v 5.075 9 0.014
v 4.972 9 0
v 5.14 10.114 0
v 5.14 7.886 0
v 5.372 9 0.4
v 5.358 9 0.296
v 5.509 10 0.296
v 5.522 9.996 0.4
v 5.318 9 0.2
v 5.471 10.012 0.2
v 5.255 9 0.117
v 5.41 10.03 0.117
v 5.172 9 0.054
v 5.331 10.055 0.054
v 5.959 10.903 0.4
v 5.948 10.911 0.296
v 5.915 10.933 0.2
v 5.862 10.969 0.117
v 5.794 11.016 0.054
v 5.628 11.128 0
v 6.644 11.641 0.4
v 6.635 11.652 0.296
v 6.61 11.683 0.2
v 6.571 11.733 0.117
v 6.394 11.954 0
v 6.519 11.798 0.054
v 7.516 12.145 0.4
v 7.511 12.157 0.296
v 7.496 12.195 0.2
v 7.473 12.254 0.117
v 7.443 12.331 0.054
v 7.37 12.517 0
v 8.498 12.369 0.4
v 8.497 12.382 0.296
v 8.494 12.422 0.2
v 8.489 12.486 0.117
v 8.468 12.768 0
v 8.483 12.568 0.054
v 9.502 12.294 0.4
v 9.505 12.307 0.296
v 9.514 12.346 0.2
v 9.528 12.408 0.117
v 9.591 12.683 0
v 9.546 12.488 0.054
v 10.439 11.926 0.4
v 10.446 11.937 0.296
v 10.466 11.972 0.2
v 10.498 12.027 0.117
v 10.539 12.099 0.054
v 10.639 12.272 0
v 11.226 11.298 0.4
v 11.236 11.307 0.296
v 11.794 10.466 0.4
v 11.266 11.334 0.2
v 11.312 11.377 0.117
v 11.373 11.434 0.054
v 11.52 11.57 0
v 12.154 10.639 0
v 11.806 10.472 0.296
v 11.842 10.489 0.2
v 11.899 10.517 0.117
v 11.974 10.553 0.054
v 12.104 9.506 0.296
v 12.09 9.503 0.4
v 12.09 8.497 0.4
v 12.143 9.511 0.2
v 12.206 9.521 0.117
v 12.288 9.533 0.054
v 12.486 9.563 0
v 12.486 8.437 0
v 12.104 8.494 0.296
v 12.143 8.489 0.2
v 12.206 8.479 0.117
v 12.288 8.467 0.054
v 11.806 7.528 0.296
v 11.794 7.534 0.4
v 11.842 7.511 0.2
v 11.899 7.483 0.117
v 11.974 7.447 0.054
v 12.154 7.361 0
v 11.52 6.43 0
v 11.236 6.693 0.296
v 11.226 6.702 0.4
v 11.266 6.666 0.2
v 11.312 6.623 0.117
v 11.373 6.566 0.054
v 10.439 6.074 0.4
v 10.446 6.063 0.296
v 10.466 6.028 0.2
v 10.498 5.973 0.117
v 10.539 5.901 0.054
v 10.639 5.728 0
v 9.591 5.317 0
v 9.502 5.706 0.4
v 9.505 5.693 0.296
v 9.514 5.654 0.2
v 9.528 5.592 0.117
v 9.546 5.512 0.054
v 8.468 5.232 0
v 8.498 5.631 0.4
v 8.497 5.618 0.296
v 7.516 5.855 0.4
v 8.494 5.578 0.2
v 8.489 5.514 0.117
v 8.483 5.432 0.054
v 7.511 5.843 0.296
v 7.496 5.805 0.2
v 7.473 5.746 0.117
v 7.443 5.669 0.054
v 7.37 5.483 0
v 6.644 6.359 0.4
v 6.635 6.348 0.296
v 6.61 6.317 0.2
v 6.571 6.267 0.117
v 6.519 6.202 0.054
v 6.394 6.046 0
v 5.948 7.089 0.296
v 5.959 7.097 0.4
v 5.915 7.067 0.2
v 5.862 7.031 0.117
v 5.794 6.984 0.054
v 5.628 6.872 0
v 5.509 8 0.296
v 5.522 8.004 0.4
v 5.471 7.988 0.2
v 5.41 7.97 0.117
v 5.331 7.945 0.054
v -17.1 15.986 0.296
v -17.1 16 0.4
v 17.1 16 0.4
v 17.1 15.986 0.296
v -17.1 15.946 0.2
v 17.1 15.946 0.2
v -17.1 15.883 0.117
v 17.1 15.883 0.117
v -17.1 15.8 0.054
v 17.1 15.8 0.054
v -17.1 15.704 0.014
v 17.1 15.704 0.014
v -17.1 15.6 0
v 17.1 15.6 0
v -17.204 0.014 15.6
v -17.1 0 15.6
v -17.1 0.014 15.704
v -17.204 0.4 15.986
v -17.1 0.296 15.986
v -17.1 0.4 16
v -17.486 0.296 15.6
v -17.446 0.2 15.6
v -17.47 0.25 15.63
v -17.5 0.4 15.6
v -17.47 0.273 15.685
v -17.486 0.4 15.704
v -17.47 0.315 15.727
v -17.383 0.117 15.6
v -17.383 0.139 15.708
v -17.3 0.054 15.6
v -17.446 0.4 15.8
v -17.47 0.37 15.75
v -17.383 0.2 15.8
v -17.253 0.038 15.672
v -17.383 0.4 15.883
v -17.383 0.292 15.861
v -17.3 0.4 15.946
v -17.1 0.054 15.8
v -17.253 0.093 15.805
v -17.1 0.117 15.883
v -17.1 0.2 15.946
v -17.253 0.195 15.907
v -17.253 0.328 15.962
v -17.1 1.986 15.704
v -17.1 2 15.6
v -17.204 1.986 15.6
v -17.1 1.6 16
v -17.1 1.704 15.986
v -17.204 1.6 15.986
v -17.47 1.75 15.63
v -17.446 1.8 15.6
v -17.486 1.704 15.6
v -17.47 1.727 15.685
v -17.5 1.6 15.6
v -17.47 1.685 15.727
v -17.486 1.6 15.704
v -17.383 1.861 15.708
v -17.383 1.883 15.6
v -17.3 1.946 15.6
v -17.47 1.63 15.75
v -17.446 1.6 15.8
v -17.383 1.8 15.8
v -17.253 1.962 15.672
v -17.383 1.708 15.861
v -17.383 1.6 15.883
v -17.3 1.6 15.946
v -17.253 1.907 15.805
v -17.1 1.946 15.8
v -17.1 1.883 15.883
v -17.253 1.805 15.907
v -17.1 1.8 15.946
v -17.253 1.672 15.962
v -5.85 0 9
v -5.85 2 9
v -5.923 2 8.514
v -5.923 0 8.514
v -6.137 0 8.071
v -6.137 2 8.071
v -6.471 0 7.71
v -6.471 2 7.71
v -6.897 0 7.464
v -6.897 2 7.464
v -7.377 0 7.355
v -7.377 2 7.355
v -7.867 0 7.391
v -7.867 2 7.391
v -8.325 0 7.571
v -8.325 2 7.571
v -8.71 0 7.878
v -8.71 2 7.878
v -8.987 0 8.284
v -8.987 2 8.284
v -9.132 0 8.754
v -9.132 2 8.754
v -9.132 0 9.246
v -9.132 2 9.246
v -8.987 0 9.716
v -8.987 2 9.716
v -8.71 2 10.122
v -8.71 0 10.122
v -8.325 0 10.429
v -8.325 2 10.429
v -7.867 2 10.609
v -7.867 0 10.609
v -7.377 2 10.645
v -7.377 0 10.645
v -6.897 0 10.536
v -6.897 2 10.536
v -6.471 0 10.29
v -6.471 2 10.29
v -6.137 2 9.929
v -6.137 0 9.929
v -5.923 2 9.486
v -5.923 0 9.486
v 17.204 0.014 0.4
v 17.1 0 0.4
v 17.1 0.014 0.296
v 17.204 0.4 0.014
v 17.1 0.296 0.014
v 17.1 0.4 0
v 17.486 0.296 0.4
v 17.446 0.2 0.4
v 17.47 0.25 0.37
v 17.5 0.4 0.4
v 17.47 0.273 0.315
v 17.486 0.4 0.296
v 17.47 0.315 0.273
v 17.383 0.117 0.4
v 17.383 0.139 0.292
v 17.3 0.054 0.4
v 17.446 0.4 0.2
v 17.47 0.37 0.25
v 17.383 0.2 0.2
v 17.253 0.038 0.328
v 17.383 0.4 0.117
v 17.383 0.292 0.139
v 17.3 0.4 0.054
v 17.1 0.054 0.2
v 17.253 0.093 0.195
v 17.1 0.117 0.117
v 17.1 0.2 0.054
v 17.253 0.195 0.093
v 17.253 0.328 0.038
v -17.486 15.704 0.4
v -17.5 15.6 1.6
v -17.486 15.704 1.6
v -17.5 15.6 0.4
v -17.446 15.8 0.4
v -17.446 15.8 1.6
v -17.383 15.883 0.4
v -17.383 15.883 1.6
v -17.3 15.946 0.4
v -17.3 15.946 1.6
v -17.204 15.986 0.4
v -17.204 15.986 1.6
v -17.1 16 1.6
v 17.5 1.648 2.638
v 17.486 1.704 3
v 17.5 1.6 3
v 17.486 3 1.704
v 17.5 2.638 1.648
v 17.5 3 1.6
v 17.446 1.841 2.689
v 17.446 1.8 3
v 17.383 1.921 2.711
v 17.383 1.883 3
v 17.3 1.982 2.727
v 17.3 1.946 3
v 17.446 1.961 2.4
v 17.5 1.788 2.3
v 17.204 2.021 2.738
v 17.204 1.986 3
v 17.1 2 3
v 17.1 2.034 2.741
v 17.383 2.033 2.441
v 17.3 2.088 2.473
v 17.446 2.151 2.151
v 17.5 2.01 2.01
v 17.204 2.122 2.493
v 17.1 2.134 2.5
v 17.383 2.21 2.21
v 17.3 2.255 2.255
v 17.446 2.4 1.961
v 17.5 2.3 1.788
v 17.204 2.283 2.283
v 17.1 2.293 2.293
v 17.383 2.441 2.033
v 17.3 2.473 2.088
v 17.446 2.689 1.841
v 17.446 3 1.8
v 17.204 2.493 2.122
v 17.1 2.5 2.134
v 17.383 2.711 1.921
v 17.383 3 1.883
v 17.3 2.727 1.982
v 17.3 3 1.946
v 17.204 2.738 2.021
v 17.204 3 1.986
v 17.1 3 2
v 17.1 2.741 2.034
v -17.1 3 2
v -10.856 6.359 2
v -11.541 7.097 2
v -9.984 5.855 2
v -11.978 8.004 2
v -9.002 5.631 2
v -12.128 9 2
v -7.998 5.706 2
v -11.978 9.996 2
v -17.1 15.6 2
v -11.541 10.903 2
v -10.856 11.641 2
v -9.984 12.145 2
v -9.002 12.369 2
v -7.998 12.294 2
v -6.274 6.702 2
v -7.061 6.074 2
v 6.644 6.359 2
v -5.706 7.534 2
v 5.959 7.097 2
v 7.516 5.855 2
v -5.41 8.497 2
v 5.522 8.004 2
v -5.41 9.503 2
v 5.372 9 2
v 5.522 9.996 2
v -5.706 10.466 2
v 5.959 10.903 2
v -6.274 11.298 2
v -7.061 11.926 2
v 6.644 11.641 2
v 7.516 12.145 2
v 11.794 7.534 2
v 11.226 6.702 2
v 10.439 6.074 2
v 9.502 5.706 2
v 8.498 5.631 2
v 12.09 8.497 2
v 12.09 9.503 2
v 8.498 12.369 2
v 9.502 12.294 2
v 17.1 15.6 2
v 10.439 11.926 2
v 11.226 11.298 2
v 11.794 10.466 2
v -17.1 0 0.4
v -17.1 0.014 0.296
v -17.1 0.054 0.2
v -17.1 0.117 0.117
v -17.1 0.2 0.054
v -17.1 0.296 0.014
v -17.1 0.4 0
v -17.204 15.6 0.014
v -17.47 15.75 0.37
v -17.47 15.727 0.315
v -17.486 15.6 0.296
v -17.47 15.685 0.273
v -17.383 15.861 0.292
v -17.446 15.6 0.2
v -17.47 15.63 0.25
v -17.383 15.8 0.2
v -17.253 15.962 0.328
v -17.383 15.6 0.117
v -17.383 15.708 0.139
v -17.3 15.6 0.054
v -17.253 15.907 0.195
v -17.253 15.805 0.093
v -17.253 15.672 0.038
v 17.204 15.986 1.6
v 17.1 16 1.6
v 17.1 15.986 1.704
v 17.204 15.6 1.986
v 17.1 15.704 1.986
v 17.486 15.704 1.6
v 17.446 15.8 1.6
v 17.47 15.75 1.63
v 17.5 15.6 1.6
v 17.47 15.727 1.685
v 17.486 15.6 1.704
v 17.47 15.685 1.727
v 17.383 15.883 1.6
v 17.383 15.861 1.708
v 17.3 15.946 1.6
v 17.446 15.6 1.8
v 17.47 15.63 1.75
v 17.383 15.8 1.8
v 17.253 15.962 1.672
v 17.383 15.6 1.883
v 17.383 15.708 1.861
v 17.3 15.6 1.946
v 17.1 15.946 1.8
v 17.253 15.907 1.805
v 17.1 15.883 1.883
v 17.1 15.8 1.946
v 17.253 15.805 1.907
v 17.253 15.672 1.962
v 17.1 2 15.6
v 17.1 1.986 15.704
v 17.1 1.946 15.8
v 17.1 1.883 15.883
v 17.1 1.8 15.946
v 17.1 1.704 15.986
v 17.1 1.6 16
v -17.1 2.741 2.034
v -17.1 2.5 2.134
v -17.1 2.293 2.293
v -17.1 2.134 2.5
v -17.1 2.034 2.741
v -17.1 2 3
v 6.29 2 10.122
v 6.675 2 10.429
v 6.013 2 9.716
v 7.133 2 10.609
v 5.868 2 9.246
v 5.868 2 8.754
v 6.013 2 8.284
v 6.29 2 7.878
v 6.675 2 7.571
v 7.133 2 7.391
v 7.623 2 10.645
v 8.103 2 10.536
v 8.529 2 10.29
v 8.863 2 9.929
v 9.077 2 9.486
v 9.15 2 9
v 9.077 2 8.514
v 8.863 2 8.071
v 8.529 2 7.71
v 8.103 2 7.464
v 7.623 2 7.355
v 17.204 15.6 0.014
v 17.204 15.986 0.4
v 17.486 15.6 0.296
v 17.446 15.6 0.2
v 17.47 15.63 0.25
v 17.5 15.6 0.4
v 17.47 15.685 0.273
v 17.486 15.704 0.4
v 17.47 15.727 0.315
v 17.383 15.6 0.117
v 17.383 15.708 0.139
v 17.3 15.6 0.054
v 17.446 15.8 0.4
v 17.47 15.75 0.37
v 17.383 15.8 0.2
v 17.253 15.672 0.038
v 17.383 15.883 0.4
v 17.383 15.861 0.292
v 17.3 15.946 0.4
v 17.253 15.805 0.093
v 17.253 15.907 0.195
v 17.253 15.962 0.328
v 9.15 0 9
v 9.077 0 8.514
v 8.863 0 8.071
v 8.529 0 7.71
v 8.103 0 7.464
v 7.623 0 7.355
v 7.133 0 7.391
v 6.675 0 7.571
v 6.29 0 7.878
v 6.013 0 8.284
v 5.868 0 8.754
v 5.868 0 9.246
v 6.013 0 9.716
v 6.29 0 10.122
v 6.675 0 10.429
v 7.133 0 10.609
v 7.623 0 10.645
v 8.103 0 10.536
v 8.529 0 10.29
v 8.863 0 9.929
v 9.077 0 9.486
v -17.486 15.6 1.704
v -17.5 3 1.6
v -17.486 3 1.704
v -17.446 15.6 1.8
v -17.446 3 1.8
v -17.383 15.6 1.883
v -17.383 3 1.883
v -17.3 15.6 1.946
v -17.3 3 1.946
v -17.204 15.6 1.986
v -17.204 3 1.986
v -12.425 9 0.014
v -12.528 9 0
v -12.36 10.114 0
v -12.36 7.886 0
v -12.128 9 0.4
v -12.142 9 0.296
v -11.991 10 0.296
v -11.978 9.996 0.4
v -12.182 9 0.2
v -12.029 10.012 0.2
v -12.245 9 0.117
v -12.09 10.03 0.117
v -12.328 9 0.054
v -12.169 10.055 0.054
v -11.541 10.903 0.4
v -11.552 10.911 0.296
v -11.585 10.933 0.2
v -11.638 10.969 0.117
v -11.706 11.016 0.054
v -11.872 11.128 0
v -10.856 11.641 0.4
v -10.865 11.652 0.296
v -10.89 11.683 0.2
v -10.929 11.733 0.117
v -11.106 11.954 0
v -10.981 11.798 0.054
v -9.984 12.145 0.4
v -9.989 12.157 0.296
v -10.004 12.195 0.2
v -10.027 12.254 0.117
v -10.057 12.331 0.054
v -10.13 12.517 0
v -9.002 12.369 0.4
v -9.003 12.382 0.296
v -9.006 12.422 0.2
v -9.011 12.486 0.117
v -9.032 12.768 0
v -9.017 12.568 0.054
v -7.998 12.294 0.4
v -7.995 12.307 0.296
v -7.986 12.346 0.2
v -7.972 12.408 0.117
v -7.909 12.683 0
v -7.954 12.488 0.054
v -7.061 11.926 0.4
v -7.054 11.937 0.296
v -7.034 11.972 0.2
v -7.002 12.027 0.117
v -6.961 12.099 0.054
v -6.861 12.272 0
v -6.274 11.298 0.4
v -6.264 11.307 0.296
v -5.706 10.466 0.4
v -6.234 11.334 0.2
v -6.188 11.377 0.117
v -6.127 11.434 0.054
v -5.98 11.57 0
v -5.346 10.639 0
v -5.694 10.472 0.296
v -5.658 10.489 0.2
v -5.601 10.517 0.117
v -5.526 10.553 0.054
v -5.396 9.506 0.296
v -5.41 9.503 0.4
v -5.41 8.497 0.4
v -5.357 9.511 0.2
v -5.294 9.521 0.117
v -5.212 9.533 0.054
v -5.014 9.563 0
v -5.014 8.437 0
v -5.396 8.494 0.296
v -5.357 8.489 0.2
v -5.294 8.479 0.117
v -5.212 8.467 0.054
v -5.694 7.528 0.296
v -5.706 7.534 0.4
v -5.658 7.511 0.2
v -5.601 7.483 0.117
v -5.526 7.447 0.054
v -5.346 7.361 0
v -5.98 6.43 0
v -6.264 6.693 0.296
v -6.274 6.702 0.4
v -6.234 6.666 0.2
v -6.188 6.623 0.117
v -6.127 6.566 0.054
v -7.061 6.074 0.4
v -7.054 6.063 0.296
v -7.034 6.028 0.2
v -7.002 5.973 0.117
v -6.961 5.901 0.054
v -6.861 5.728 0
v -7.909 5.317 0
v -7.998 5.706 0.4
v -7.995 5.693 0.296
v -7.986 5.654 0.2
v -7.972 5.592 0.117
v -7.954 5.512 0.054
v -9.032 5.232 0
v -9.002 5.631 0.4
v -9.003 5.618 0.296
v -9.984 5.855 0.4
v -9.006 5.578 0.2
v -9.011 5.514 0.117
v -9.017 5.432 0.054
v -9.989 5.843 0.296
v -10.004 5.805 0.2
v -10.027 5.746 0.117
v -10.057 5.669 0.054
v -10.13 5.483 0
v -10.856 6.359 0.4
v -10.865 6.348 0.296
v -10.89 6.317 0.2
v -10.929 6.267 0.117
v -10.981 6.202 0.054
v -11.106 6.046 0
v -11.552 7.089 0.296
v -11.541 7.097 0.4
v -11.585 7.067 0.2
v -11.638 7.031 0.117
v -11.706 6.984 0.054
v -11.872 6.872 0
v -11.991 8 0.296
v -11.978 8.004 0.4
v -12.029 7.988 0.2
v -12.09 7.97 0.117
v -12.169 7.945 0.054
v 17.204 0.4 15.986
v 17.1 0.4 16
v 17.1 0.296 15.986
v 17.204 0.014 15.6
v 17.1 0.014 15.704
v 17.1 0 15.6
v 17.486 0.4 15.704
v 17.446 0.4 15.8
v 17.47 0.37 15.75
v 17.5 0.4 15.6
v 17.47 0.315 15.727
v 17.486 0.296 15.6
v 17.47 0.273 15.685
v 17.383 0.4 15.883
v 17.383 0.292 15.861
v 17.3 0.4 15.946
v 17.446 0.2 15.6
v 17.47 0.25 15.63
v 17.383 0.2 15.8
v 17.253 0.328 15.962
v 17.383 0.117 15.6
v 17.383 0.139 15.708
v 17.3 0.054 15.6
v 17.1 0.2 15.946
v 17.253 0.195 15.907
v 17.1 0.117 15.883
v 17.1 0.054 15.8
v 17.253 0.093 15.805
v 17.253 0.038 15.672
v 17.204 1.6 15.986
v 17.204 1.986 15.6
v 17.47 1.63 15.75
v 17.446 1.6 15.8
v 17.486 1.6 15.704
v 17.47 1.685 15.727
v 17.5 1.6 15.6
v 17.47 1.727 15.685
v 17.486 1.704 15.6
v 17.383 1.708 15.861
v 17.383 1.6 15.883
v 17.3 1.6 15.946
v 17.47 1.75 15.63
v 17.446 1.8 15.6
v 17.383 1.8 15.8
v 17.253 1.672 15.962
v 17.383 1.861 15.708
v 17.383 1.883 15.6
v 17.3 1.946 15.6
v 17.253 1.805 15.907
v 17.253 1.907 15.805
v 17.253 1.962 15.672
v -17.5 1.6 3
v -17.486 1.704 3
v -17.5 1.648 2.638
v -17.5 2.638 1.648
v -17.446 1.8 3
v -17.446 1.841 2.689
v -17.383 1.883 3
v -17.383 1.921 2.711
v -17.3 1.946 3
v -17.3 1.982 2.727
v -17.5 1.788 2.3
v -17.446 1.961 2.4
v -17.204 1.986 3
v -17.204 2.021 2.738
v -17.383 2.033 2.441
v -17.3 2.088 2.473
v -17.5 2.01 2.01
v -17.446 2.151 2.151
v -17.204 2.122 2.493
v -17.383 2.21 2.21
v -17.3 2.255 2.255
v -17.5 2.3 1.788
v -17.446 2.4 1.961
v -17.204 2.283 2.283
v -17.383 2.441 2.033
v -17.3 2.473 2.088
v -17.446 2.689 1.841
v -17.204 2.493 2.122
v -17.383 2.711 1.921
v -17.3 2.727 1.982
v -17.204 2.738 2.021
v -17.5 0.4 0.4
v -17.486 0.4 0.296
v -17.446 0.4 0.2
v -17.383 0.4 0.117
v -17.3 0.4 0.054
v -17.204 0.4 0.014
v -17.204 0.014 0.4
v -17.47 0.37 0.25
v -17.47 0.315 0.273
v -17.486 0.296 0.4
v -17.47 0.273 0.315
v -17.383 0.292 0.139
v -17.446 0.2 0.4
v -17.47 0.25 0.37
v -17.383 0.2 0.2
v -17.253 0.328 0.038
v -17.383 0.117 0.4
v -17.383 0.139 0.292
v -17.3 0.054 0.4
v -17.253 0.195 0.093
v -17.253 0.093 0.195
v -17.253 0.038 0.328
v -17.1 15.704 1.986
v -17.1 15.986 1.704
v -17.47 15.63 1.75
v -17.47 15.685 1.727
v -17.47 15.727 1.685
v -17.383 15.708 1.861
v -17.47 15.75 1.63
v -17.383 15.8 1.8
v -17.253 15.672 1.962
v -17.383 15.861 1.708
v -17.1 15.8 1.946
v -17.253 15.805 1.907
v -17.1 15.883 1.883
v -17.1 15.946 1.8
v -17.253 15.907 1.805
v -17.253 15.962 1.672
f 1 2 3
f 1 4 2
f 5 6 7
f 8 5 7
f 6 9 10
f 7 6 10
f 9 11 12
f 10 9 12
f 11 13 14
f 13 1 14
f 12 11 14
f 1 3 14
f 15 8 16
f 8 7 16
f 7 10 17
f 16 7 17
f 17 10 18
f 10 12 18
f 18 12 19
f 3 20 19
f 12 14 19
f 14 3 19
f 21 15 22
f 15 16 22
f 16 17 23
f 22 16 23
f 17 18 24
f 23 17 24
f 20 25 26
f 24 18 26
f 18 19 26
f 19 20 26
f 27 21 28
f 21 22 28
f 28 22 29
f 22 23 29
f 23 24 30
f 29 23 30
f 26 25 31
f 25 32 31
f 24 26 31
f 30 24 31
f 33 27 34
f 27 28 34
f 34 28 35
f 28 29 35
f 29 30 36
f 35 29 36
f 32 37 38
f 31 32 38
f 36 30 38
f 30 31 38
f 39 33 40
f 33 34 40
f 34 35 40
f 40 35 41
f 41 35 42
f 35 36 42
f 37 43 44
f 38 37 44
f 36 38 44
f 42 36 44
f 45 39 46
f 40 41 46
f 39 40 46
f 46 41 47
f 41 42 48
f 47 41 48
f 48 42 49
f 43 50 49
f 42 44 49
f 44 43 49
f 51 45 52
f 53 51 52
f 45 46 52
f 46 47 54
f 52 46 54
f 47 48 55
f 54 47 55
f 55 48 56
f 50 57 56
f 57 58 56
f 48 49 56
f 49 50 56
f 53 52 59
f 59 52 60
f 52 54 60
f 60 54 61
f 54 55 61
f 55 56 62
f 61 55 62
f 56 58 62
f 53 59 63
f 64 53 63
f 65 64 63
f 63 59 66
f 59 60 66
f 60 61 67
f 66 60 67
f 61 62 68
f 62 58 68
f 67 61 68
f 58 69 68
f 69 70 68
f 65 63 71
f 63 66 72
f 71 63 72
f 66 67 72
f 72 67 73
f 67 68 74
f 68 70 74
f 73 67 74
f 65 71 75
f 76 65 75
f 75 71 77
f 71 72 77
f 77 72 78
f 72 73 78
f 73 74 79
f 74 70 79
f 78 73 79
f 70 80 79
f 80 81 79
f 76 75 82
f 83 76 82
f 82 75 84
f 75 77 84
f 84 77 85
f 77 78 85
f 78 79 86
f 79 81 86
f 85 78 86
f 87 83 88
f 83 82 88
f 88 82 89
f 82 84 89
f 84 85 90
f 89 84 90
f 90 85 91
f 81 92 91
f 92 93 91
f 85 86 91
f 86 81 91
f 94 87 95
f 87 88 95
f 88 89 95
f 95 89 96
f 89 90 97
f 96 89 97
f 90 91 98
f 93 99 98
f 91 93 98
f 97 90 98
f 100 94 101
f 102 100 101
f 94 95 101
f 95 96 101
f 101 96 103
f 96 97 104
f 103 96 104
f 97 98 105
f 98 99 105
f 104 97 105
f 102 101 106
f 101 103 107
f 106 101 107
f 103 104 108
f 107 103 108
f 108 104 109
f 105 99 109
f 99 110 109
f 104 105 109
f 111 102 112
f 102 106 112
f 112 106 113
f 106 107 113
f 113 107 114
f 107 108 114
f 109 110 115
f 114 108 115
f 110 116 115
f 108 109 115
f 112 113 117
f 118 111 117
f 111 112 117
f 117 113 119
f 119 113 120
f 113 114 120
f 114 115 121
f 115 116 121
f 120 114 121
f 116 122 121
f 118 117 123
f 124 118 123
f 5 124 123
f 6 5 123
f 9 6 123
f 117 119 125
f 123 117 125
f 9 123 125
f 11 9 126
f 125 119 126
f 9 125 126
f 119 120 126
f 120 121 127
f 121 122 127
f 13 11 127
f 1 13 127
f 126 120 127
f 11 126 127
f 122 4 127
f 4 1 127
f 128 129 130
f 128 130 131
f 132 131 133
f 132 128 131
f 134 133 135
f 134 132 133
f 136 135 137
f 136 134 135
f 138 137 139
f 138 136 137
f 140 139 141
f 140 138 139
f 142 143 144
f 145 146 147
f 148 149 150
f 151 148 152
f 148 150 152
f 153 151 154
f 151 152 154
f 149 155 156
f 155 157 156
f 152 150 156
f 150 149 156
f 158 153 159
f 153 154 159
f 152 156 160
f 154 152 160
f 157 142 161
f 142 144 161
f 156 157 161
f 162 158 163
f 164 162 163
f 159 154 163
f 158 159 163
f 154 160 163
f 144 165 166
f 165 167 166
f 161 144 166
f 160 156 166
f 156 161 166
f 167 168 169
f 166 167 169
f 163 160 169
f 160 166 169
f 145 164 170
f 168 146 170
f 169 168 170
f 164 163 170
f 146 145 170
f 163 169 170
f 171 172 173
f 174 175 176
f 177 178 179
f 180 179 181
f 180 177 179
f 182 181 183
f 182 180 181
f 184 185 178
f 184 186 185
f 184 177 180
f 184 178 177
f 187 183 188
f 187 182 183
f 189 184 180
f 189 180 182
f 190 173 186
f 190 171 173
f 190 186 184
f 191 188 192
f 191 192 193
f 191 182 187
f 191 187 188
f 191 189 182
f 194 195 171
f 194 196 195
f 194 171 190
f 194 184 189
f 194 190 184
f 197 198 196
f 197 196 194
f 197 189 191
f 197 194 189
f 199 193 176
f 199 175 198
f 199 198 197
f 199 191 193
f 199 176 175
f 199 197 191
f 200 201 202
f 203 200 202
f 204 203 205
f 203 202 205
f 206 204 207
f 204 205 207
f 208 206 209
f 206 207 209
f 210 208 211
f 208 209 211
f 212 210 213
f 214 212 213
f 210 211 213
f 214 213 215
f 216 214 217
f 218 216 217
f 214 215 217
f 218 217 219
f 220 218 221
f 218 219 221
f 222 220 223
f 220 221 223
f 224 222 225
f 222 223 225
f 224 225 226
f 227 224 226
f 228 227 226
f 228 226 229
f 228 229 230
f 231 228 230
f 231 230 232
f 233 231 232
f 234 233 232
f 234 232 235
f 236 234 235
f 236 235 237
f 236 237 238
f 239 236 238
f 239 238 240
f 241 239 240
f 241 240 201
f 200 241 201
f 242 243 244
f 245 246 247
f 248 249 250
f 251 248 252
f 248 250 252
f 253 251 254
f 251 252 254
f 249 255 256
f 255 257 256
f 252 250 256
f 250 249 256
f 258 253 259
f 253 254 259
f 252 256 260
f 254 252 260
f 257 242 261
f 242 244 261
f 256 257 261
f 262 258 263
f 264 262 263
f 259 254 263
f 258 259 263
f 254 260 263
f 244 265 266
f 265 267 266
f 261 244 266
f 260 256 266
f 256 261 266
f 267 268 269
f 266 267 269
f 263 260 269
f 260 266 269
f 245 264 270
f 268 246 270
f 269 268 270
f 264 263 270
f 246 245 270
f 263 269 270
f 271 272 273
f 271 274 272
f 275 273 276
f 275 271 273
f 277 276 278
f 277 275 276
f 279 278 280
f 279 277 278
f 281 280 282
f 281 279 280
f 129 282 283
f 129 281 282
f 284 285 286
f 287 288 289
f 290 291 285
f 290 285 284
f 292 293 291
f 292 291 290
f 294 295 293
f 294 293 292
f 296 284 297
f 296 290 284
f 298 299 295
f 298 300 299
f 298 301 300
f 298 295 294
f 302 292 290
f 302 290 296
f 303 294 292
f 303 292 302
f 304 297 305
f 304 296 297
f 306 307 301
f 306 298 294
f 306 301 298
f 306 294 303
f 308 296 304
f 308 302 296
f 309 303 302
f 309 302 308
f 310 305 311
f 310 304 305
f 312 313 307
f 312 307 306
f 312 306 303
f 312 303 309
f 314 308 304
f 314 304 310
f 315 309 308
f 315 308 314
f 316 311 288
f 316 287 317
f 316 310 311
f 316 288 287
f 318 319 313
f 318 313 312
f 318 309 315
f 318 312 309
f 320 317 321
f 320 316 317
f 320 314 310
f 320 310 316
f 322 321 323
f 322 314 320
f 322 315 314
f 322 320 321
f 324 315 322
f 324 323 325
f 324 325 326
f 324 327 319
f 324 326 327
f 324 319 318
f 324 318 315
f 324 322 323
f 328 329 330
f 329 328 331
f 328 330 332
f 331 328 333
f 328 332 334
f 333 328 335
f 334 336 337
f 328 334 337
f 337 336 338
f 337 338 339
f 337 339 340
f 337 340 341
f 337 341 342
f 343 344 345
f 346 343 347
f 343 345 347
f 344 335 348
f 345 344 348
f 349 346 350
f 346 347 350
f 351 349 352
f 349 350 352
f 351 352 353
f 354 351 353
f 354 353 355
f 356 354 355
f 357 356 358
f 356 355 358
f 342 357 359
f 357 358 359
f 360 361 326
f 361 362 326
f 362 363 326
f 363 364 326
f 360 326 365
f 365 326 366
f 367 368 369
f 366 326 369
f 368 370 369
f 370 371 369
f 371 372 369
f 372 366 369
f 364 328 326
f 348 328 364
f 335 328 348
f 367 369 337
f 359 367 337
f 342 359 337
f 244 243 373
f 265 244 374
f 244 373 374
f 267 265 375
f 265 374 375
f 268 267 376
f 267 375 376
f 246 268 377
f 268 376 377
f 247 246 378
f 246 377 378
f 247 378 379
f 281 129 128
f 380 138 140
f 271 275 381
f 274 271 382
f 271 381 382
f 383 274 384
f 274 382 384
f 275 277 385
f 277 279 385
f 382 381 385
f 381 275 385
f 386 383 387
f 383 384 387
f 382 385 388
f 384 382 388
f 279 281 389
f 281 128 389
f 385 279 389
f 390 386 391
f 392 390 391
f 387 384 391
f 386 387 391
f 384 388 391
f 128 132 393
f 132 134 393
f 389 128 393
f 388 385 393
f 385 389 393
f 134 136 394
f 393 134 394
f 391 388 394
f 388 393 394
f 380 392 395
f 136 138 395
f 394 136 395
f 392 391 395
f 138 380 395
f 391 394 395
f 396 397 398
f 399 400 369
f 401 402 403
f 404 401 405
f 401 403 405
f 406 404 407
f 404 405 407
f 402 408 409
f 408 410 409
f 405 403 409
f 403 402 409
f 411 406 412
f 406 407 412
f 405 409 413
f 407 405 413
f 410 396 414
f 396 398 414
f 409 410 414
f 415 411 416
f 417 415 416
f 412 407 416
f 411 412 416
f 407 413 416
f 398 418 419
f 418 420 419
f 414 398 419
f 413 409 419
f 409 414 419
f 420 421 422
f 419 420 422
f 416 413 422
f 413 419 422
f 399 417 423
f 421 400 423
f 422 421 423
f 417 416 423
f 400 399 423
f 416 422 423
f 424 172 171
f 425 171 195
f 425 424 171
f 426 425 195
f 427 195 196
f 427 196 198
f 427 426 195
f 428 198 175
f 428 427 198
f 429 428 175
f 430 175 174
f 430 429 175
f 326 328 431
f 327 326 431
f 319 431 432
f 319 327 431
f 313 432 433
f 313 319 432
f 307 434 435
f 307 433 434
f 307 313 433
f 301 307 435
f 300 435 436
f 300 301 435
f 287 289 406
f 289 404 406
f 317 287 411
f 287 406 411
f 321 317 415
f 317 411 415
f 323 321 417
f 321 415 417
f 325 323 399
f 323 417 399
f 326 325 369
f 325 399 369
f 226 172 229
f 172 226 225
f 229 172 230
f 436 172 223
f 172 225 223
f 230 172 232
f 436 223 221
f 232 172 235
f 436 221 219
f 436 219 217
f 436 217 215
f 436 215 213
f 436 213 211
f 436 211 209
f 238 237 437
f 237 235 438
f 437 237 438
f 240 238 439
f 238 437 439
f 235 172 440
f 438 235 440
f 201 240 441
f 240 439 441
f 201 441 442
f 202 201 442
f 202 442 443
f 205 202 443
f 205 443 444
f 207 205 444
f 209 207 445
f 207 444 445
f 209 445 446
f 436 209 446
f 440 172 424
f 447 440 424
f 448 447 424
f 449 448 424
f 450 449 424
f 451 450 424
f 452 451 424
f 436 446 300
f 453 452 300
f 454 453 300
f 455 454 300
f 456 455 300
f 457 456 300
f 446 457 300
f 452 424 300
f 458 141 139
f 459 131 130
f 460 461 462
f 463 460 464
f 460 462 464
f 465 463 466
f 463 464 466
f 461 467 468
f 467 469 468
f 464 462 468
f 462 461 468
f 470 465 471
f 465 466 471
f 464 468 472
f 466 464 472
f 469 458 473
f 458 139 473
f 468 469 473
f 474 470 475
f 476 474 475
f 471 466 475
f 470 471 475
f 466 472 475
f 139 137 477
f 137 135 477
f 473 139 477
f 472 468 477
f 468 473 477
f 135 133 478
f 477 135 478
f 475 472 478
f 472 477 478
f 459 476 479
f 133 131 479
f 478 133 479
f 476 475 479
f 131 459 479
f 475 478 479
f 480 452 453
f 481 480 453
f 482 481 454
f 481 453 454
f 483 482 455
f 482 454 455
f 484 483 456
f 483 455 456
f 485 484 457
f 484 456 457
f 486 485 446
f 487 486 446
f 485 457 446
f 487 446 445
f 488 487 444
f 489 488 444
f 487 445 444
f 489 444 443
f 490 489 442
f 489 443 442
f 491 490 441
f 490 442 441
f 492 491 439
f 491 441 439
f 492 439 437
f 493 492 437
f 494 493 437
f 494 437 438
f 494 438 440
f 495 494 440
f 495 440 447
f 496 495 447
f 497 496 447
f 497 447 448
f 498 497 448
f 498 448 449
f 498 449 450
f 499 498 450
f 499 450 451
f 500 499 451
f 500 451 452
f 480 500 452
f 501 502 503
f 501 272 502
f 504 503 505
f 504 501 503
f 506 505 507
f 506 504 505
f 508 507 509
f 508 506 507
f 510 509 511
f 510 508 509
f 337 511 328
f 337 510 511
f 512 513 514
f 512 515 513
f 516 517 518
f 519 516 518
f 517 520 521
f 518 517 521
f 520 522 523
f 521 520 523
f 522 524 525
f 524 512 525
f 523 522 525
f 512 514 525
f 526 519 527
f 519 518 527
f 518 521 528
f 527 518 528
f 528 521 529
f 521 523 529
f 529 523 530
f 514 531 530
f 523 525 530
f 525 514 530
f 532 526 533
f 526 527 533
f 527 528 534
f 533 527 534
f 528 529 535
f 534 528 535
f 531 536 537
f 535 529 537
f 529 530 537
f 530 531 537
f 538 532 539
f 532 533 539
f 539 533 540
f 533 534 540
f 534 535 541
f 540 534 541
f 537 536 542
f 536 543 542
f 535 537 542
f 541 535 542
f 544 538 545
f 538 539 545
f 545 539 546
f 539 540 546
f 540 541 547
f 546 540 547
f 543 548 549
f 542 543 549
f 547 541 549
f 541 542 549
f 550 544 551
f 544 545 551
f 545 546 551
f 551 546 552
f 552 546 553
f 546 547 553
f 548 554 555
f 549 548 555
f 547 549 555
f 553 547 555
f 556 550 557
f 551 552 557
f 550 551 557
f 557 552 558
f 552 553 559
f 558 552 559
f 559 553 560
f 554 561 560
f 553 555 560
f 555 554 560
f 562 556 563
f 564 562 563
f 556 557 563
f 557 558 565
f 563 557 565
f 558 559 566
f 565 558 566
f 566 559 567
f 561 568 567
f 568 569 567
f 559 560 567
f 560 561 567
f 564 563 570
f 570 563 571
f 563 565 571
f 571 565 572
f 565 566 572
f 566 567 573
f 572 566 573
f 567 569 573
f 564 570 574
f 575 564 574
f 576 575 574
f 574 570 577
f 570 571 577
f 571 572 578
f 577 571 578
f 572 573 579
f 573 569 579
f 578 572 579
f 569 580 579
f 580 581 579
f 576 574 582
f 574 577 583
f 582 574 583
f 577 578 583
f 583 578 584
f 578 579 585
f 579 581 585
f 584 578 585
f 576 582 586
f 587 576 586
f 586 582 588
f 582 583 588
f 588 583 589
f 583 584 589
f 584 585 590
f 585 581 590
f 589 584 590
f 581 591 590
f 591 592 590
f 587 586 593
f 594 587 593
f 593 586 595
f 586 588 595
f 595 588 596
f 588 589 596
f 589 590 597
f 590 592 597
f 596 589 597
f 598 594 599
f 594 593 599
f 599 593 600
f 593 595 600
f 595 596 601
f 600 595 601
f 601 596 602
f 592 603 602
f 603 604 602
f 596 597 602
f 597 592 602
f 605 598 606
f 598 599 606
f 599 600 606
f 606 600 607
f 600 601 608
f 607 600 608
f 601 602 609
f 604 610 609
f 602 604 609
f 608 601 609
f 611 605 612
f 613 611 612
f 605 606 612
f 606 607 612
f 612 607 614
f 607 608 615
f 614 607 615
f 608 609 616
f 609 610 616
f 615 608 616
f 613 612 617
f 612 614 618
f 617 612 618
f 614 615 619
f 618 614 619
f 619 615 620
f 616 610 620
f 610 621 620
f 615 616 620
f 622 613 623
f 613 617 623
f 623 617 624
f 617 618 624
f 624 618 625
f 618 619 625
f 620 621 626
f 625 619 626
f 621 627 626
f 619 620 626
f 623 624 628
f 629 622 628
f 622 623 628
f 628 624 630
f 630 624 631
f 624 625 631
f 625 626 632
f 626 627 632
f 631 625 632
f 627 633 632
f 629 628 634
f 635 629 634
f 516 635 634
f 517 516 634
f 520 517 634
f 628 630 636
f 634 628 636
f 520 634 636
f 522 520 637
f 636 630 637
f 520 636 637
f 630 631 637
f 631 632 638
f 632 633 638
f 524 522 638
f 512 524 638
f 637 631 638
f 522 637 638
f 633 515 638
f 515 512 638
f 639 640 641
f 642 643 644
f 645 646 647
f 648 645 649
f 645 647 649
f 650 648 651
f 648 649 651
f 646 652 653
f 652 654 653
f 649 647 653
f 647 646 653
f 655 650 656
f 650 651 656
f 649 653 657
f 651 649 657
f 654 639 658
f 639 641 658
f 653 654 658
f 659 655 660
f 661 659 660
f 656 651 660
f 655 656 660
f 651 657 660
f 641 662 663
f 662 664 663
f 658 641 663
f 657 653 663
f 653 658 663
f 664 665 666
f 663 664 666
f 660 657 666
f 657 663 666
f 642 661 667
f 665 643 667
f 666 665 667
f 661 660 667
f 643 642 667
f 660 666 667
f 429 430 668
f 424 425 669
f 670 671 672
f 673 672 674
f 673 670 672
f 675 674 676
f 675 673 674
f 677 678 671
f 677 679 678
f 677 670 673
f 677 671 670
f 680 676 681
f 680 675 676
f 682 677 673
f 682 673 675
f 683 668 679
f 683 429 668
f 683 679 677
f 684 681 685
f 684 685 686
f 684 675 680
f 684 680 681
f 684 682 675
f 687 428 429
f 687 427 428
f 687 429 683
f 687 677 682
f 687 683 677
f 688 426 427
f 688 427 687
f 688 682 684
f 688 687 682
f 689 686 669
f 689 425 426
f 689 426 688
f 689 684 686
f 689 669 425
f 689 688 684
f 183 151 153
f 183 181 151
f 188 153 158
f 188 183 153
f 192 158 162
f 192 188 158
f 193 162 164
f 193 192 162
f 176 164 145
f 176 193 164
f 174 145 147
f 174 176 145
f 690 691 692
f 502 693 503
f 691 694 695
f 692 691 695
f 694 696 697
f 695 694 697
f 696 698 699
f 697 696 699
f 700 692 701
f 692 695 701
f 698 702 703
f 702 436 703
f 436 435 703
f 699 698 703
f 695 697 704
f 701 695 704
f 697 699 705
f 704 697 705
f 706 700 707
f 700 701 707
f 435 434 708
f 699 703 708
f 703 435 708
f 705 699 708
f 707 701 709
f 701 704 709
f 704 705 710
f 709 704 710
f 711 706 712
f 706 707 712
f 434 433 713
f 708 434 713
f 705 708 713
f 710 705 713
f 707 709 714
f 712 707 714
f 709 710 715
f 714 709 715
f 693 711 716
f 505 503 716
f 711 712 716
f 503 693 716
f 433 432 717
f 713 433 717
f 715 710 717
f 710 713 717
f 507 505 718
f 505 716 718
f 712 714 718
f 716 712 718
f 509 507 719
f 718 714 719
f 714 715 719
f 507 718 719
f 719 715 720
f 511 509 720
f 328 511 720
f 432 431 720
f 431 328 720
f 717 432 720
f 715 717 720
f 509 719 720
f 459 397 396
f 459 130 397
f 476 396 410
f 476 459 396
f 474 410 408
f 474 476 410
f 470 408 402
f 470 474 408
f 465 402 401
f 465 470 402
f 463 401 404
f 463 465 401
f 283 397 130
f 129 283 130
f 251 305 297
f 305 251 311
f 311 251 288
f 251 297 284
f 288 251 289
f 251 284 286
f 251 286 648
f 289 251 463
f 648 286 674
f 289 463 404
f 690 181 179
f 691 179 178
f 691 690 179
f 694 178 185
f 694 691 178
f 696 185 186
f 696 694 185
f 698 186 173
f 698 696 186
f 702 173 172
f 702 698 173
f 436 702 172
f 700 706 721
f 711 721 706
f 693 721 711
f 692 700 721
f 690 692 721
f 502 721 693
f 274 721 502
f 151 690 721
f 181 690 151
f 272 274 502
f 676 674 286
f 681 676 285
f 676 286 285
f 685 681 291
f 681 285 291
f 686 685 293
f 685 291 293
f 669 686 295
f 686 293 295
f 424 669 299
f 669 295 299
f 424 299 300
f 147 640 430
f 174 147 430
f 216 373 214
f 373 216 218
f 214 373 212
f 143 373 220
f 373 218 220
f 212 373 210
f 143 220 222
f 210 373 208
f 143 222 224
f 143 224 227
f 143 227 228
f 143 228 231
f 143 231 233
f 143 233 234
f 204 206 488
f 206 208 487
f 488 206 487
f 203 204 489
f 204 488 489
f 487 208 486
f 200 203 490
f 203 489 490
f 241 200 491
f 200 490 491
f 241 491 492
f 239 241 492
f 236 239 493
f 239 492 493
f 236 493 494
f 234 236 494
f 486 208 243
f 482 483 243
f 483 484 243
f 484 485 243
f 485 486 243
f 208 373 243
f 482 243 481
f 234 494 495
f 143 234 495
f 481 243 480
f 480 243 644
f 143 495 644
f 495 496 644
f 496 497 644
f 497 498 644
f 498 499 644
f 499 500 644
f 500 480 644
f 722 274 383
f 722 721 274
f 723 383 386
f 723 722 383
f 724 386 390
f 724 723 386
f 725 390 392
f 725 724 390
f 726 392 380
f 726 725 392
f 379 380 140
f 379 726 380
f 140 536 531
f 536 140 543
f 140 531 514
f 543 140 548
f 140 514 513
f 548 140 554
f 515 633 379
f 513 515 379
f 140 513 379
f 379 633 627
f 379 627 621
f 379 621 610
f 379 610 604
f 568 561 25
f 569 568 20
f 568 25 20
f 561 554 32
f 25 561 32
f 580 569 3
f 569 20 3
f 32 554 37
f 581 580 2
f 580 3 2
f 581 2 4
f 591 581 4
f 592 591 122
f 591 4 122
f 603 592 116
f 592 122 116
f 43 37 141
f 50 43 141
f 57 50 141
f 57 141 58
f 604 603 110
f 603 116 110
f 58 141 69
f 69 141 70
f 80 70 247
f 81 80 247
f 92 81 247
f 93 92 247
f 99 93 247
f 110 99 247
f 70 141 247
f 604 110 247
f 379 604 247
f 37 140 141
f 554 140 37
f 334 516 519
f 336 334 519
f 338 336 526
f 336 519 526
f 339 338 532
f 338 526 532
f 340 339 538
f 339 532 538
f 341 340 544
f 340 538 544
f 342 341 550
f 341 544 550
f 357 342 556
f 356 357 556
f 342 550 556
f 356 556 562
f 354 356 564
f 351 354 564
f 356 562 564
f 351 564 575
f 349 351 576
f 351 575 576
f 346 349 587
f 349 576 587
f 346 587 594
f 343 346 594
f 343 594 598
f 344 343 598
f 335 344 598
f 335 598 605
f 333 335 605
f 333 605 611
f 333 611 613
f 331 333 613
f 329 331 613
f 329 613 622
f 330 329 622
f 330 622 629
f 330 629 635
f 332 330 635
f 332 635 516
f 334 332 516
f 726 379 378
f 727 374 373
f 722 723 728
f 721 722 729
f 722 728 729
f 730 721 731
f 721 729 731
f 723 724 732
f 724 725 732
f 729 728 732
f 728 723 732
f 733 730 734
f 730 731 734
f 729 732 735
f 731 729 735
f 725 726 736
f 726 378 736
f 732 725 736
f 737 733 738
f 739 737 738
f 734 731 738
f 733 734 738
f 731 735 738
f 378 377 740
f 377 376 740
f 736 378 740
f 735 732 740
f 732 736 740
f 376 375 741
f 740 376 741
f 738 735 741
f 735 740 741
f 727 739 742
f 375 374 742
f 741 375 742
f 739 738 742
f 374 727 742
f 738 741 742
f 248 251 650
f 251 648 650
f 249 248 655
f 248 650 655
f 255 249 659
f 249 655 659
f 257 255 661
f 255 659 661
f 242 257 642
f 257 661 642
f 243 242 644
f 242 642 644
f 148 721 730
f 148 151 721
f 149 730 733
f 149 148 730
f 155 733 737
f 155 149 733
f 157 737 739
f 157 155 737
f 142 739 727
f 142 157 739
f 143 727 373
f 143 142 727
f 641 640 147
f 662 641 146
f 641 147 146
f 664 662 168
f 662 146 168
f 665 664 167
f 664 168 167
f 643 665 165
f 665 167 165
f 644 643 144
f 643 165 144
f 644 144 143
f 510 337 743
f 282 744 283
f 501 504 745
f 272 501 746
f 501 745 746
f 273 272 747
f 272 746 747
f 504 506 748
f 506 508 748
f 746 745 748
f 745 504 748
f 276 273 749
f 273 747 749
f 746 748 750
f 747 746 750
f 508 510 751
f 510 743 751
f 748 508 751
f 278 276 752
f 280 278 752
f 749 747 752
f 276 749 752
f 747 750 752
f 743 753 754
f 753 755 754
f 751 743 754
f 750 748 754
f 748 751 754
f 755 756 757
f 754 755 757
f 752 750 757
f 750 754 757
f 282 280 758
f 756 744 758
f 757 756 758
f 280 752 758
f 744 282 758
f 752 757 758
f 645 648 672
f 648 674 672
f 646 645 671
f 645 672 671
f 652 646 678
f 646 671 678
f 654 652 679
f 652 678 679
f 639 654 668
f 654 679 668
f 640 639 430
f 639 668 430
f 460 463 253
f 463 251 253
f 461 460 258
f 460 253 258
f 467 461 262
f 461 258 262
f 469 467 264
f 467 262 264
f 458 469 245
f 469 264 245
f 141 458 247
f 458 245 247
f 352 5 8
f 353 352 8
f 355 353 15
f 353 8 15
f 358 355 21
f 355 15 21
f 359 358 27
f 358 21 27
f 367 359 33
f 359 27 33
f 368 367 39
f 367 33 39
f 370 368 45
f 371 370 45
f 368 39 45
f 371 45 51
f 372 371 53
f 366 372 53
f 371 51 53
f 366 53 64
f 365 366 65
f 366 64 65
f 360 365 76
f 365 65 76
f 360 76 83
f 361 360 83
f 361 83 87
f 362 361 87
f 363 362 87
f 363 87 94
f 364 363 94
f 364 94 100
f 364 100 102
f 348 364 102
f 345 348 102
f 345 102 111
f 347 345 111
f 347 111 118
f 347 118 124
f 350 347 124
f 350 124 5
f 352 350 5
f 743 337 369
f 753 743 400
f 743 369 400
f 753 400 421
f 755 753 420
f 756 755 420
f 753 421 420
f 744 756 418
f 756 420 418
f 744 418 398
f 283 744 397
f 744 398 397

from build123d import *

# Parameters (mm, degrees)
MOUNT_DEPTH                  = 17.5
F_1_4_ANTENNA_HOLES_D        = 6.7564
SKETCH6_R                    = 1.65
M3_STANDOFF_HOLES_DEPTH      = 15
M3_STANDOFF_HOLES_DEPTH_BACK = 3
INSIDE_FILLET_R              = 1
EXTERNAL_FILLETS_R           = 0.4


with BuildPart() as part:
    # Sketch1 → Mount (new body, symmetric)
    with BuildSketch(Plane(origin=(0, 0, 0), x_dir=(0, 0, -1), z_dir=(1, 0, 0))):
        Polygon((-2, 16), (0, 16), (0, 0), (-16, 0), (-16, 2), (-2, 2), align=None)
    extrude(amount=MOUNT_DEPTH, both=True)

    # 1/4" Antenna Holes (through all)
    with Locations(Plane.XY.offset(2)):
        with Locations((-8.75, 9), (8.75, 9)):
            Hole(F_1_4_ANTENNA_HOLES_D / 2)

    # Sketch6 → M3 Standoff Holes (cut, two sides)
    with BuildSketch(Plane(origin=(0, 2, 0), x_dir=(1, 0, 0), z_dir=(0, 1, 0))) as m3_standoff_holes_sk:
        with Locations((-7.5, -9)):
            Circle(SKETCH6_R)
        with Locations((7.5, -9)):
            Circle(SKETCH6_R)
    extrude(amount=M3_STANDOFF_HOLES_DEPTH, mode=Mode.SUBTRACT)
    extrude(m3_standoff_holes_sk.sketch, amount=-M3_STANDOFF_HOLES_DEPTH_BACK, mode=Mode.SUBTRACT)

    # Inside Fillet
    inside_fillet_edges = [part.edges().sort_by_distance(p)[0] for p in [
        (0, 2, 2),
    ]]
    fillet(inside_fillet_edges, radius=INSIDE_FILLET_R)

    # External Fillets
    external_fillets_edges = [part.edges().sort_by_distance(p)[0] for p in [
        (0, 16, 2),
        (0, 16, 0),
        (0, 0, 0),
        (0, 0, 16),
        (0, 2, 16),
        (17.5, 1, 16),
        (17.5, 0, 8),
        (17.5, 8, 0),
        (12.1282, 9, 0),
        (17.5, 16, 1),
        (-5.3718, 9, 0),
        (-17.5, 2, 9.5),
        (17.5, 2, 9.5),
        (-17.5, 2.292893219, 2.292893219),
        (17.5, 2.292893219, 2.292893219),
        (17.5, 9.5, 2),
        (-17.5, 16, 1),
        (-17.5, 8, 0),
        (-17.5, 0, 8),
        (-17.5, 1, 16),
        (-17.5, 9.5, 2),
    ]]
    fillet(external_fillets_edges, radius=EXTERNAL_FILLETS_R)


solid = part.part
